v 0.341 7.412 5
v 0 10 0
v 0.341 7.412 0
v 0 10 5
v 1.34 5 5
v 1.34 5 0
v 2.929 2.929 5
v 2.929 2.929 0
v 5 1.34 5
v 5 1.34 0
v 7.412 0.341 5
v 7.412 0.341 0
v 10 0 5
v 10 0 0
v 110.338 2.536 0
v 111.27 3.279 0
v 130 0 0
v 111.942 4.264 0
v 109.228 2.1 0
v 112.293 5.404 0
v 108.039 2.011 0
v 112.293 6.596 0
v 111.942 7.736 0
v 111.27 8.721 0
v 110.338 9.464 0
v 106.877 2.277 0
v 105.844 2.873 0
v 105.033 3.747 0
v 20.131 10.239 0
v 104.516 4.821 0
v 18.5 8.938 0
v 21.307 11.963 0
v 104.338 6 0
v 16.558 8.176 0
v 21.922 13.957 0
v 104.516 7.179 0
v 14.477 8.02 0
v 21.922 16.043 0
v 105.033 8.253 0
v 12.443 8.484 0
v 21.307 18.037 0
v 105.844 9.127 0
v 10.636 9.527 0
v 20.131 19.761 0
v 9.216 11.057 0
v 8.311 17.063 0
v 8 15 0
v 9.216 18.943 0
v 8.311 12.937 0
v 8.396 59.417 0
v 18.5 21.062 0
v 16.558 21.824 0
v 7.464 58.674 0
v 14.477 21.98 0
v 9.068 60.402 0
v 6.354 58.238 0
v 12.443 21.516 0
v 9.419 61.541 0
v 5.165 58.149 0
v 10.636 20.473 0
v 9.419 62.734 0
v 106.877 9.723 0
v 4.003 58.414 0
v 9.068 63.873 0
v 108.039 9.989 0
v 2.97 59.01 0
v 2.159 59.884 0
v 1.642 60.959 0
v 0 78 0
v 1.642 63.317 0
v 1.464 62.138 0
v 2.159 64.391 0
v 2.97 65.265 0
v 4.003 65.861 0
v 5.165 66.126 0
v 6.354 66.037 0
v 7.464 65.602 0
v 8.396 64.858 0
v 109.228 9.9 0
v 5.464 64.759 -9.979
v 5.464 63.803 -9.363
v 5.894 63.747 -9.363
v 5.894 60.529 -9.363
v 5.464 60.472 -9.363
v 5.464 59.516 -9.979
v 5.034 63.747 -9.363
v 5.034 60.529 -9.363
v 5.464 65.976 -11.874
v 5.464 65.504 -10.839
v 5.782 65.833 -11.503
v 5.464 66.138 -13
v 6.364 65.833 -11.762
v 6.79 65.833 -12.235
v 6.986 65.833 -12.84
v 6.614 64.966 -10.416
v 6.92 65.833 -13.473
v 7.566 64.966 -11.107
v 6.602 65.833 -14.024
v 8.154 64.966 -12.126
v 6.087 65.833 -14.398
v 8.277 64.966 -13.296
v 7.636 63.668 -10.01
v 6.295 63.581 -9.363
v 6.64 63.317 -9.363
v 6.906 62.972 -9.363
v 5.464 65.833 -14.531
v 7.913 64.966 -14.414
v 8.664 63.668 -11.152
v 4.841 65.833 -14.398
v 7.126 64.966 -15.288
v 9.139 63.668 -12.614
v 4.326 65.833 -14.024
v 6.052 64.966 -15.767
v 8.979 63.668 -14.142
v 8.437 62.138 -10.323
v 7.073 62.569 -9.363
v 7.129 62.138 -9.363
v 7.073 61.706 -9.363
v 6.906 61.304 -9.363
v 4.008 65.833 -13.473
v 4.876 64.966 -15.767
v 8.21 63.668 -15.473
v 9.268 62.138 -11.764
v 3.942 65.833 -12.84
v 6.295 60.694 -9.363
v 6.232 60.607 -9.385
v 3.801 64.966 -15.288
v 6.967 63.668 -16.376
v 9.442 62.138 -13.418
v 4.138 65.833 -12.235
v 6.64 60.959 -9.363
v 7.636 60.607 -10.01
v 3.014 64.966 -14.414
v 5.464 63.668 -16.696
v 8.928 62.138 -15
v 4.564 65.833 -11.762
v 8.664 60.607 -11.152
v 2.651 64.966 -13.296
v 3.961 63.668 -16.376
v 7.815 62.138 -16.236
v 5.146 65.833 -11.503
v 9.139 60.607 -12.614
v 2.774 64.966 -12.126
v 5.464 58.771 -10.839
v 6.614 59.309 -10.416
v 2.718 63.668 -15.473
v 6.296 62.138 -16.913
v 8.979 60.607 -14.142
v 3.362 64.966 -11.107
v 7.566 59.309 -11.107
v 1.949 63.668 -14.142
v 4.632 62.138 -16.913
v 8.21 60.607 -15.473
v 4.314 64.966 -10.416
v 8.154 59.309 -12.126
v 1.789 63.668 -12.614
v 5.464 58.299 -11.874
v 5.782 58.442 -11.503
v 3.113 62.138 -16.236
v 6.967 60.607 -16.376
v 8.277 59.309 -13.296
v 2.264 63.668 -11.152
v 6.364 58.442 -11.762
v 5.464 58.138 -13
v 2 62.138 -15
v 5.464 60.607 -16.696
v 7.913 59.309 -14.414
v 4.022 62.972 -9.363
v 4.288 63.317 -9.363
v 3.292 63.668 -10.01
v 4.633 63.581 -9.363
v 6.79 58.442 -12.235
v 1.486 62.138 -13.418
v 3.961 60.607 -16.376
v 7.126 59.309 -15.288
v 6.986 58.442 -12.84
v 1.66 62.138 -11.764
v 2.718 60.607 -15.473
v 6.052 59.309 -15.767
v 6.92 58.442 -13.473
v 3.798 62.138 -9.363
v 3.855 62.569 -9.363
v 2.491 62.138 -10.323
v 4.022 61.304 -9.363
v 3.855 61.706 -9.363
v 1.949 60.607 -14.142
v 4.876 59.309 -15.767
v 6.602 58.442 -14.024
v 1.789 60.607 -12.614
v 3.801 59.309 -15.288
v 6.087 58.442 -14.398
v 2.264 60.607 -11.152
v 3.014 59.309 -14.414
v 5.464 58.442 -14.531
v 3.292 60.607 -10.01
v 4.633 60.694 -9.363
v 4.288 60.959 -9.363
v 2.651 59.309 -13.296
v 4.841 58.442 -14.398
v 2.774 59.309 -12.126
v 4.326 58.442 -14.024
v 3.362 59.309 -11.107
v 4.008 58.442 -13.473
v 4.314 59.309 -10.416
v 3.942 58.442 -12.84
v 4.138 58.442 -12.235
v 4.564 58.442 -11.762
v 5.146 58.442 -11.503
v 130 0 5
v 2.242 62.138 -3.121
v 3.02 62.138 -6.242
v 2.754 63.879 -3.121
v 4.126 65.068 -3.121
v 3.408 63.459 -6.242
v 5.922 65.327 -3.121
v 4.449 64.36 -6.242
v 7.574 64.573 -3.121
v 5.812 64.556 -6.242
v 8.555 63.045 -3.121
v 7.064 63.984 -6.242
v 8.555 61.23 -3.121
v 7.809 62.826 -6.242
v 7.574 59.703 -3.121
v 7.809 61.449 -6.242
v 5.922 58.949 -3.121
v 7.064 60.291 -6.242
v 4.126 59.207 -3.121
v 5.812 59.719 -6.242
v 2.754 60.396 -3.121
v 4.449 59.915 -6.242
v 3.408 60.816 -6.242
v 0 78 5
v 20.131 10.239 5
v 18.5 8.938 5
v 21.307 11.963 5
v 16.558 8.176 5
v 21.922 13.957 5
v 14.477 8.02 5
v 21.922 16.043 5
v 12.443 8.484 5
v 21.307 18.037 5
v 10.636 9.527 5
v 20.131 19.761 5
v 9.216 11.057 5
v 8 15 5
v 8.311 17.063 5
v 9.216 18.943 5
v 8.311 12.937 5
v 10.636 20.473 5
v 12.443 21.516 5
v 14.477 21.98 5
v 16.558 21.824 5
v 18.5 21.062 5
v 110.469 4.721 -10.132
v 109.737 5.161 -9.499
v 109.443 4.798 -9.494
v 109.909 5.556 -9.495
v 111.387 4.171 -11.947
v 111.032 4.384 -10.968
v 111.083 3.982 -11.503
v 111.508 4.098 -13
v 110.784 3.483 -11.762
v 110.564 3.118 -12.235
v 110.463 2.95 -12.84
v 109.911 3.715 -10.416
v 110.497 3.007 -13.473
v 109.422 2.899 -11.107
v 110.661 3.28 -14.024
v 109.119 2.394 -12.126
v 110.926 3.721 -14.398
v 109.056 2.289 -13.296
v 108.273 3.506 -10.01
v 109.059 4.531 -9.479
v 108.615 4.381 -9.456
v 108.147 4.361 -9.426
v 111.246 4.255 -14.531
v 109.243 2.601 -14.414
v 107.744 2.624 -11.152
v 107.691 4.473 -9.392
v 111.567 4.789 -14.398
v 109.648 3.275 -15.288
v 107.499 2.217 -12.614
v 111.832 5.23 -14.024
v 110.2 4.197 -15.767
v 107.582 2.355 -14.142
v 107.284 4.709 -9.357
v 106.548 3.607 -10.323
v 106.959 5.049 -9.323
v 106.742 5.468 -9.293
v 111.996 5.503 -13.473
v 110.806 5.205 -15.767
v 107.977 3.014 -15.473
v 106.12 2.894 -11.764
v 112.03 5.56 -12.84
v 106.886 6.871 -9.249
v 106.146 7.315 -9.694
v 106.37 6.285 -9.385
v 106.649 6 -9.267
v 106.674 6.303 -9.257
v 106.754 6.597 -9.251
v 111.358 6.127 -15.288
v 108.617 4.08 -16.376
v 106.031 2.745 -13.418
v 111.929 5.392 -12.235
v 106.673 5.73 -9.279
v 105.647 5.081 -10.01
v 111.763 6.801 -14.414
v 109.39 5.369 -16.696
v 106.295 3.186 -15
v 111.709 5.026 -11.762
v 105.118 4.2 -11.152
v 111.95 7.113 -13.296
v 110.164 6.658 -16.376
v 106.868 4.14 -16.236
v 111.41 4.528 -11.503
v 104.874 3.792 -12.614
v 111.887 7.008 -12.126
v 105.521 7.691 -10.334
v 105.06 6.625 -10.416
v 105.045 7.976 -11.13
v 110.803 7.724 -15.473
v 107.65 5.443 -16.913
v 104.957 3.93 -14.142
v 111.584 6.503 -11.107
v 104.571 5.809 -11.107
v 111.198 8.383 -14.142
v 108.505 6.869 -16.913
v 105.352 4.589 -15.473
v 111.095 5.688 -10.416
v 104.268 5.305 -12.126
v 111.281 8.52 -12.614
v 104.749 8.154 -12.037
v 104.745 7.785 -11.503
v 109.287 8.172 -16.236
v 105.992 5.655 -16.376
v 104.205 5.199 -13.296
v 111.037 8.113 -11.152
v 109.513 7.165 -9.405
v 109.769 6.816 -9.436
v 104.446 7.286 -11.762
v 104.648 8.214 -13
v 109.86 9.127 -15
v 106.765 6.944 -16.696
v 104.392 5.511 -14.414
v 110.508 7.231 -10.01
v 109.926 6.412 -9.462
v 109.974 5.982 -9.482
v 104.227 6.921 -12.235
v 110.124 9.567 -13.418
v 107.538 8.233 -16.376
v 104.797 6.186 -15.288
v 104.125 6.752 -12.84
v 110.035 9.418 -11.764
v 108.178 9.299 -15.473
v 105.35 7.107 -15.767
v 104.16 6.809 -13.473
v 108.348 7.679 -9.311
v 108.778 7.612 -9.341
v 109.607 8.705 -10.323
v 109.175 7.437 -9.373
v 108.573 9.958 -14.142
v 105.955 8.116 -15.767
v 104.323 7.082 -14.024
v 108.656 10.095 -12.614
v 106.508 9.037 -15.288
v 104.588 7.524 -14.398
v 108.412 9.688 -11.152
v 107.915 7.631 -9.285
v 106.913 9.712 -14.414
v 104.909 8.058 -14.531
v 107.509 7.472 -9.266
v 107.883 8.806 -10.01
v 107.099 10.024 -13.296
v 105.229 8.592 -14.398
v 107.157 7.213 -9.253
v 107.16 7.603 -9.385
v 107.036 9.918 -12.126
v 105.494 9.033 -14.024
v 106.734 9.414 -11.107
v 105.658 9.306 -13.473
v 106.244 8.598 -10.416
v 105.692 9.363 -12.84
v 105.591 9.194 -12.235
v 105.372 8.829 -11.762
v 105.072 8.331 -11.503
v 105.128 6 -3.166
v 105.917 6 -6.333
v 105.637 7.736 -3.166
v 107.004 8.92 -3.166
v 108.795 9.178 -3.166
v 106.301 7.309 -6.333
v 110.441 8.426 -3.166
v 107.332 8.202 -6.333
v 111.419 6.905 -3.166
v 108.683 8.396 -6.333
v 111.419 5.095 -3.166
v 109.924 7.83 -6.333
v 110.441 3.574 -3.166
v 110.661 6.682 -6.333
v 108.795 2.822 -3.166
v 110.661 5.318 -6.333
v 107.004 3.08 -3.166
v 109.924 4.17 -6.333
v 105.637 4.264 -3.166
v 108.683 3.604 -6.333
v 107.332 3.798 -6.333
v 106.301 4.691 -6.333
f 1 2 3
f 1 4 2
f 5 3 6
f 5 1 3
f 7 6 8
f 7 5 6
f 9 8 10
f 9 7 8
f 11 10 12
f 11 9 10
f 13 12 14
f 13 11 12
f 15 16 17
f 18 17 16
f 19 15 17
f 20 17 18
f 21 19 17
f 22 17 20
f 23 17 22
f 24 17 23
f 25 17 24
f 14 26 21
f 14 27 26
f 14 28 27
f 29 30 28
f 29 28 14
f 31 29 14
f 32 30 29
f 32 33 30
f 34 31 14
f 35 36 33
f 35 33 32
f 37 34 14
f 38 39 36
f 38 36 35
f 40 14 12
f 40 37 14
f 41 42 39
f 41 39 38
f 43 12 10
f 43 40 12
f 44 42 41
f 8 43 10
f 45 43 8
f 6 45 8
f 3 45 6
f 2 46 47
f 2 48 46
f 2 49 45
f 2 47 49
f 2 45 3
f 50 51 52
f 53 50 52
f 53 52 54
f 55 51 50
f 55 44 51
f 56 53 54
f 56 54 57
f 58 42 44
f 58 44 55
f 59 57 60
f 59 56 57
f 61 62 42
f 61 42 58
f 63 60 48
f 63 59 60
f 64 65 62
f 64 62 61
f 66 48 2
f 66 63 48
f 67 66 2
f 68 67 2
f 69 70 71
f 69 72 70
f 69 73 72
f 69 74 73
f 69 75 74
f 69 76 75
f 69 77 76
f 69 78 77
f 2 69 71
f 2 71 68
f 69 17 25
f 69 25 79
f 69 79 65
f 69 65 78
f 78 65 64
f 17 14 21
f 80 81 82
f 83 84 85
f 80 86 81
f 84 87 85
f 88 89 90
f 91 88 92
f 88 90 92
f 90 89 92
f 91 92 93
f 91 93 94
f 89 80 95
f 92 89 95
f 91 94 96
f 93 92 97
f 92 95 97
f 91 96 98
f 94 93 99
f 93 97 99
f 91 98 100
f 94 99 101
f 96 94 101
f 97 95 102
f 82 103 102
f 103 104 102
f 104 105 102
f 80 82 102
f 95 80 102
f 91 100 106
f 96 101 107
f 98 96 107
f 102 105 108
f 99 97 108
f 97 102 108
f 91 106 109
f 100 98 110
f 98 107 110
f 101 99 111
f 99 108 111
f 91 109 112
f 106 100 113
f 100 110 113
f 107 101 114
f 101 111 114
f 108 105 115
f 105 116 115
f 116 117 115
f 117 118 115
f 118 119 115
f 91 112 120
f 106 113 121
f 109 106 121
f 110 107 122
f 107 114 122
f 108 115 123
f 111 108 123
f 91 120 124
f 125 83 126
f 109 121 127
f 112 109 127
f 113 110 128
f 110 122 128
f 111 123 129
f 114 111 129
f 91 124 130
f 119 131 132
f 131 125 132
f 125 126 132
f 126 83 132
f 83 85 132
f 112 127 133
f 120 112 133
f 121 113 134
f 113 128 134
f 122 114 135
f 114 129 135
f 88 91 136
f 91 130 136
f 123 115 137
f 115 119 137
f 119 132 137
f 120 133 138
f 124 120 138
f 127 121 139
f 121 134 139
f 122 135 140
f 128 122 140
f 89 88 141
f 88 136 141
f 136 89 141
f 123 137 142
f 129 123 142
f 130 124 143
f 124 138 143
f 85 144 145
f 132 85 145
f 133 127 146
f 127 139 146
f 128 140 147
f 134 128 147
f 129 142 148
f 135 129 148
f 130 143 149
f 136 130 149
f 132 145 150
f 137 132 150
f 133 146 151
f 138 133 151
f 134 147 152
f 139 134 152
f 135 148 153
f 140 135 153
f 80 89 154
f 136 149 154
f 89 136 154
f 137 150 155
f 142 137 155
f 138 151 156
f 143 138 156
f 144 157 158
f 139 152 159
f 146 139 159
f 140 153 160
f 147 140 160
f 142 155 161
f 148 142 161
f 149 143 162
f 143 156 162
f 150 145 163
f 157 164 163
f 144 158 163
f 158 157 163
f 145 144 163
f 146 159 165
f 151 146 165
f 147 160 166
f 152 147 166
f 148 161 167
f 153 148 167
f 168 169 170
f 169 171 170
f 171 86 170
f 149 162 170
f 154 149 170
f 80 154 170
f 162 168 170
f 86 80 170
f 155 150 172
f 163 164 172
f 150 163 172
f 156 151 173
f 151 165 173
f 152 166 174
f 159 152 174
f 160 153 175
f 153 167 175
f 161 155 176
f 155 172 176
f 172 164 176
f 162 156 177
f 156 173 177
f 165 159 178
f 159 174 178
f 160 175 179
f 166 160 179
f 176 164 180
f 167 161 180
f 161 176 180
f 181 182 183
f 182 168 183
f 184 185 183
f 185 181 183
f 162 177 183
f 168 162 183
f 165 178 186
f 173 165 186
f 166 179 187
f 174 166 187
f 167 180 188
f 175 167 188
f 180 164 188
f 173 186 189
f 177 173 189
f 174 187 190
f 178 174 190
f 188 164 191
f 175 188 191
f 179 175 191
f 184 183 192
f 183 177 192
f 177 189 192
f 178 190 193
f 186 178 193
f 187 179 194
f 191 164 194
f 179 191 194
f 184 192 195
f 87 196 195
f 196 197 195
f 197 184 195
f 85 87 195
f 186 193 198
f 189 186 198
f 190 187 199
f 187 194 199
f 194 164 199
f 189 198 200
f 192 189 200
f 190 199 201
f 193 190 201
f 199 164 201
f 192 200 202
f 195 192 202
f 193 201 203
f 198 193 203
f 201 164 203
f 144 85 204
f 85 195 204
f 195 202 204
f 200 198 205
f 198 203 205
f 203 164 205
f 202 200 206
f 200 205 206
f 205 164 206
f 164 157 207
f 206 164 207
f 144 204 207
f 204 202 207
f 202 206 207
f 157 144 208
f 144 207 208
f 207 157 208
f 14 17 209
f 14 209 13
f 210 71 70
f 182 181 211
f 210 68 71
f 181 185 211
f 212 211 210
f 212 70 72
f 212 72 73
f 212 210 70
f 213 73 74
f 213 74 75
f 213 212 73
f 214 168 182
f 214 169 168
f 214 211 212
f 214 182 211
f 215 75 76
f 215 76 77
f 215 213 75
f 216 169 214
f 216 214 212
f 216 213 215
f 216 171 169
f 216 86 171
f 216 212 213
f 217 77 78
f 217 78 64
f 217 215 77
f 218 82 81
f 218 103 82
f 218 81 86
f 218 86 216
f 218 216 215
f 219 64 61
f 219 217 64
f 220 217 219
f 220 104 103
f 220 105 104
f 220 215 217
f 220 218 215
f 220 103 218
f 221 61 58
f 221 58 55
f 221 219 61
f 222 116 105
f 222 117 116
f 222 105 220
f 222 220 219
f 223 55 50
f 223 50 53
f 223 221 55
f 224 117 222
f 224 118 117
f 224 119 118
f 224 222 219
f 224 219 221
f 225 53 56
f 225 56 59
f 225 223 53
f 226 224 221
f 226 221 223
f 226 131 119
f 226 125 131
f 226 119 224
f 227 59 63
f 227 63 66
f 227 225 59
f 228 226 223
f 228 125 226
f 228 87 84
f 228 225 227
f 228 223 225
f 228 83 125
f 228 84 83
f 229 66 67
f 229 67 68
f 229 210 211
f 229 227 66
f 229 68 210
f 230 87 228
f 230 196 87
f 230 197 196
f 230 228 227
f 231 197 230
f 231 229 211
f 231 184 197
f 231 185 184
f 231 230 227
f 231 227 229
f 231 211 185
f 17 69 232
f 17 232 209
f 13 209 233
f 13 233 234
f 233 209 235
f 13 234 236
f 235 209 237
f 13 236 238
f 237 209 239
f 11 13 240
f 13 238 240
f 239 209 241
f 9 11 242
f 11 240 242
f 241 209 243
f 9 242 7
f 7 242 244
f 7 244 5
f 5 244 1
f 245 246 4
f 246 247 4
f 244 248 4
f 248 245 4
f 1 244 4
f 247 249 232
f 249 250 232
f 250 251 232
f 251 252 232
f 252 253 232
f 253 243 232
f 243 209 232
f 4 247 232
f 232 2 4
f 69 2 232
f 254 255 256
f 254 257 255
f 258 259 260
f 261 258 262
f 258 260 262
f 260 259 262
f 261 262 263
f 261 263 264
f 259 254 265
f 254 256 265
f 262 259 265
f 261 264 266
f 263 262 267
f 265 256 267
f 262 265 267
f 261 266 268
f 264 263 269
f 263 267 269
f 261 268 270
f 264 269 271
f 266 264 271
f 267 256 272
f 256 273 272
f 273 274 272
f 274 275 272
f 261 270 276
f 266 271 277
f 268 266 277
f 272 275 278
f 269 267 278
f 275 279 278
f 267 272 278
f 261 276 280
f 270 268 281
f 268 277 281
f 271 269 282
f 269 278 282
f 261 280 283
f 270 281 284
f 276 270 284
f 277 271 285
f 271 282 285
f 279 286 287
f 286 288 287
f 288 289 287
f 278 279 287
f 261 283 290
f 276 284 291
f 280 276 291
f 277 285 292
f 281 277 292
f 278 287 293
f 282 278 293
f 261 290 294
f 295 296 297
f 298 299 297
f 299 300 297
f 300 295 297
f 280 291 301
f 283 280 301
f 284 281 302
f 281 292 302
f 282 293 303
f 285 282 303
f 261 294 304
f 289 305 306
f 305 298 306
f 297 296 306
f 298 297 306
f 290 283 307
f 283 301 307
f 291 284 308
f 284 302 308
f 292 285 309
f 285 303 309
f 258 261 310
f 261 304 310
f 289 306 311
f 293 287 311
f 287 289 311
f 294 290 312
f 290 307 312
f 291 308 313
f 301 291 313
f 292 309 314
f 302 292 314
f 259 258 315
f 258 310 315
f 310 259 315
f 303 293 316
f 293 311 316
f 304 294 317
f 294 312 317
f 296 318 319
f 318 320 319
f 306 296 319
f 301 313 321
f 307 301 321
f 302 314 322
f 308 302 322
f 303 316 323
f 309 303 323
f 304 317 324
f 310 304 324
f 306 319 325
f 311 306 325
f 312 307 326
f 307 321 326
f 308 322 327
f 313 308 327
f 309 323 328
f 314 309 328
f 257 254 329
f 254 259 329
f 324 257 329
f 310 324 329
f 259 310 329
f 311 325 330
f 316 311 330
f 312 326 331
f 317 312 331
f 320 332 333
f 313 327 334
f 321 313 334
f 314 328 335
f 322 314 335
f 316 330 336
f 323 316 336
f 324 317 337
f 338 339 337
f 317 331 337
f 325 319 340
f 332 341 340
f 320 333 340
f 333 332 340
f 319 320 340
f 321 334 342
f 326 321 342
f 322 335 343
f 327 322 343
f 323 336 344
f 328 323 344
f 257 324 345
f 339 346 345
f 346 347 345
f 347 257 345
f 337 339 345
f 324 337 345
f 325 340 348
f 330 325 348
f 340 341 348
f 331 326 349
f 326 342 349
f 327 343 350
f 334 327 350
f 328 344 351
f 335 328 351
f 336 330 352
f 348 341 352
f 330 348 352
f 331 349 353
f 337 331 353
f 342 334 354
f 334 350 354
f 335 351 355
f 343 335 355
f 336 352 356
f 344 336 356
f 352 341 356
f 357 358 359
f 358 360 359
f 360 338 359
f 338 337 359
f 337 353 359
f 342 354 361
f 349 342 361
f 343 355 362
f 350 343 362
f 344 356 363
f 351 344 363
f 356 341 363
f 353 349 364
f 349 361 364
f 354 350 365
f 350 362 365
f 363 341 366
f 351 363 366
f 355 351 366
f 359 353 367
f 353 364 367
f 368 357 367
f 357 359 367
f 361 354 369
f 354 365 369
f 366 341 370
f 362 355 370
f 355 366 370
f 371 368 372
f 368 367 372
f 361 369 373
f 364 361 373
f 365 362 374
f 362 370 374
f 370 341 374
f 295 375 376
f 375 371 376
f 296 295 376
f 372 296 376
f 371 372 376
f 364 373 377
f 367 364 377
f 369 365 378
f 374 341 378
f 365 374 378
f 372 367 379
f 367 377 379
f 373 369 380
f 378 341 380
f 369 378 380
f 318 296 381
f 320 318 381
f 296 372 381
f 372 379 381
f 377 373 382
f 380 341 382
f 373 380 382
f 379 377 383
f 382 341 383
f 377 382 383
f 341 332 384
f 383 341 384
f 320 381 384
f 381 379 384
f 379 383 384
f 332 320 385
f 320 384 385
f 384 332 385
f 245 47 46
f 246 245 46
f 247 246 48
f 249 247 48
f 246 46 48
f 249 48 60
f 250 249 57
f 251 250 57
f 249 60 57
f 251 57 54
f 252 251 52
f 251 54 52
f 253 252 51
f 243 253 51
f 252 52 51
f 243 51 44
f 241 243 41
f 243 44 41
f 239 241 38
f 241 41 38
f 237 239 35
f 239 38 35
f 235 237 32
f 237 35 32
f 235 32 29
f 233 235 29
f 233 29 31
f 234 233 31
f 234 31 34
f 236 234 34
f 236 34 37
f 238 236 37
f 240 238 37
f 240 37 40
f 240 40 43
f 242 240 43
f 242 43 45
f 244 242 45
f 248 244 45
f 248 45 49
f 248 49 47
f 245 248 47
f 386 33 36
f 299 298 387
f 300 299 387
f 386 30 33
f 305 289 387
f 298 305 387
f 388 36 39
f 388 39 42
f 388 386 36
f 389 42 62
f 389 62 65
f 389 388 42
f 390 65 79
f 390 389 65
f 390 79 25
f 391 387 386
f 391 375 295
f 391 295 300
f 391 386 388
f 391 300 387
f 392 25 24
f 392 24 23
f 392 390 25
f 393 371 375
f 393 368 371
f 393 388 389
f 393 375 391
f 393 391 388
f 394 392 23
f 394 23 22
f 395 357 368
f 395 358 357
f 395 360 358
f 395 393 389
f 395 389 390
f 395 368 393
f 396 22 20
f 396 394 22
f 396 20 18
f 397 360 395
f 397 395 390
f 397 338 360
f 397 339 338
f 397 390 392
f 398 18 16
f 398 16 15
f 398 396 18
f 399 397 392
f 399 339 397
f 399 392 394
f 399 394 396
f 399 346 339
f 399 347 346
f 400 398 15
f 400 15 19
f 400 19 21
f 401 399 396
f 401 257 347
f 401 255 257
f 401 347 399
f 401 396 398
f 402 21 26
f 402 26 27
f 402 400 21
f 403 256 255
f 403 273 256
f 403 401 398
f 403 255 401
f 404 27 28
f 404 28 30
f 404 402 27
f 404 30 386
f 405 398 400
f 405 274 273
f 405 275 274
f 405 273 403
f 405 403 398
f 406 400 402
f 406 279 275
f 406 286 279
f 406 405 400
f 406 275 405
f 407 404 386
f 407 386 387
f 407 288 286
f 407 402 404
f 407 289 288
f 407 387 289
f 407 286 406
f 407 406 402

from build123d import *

# Parameters (mm, degrees)
ESTRUSIONE_ESTRUSIONE1_DEPTH = 5
SCHIZZO2_R                   = 7
TAGLIO_ESTRUSIONE1_DEPTH     = 152.6871781
RACCORDO1_R                  = 10
SCHIZZO10_R                  = 4
ESTRUSIONE_ESTRUSIONE2_DEPTH = 10
ESTRUSIONE_ESTRUSIONE2_TAPER = 14
SCHIZZO13_R                  = 4
ESTRUSIONE_ESTRUSIONE3_DEPTH = 10
ESTRUSIONE_ESTRUSIONE3_TAPER = 14


with BuildPart() as part:
    # Schizzo1 → Estrusione-Estrusione1 (new body)
    with BuildSketch(Plane.XY):
        Polygon((0, 0), (0, 78), (130, 0), align=None)
    extrude(amount=ESTRUSIONE_ESTRUSIONE1_DEPTH)

    # Schizzo2 → Taglio-Estrusione1 (cut, through all)
    with BuildSketch(Plane(origin=(0, 0, 0), x_dir=(-1, 0, 0), z_dir=(0, 0, -1))):
        with Locations((-15, 15)):
            Circle(SCHIZZO2_R)
    extrude(amount=-TAGLIO_ESTRUSIONE1_DEPTH, mode=Mode.SUBTRACT)

    # Raccordo1
    raccordo1_edges = [part.edges().sort_by_distance(p)[0] for p in [
        (0, 0, 2.5),
    ]]
    fillet(raccordo1_edges, radius=RACCORDO1_R)

    # Schizzo10 → Estrusione-Estrusione2 (add)
    with BuildSketch(Plane(origin=(0, 0, 0), x_dir=(-1, 0, 0), z_dir=(0, 0, -1))):
        with Locations((-5.463985213, 62.137606809)):
            Circle(SCHIZZO10_R)
    extrude(amount=ESTRUSIONE_ESTRUSIONE2_DEPTH, taper=ESTRUSIONE_ESTRUSIONE2_TAPER)

    # Schizzo12 → Rivoluzione1 (revolve)
    with BuildSketch(Plane.ZY.offset(-5.463985213)):
        with BuildLine():
            Line((-13, 58.137606809), (-13, 66.137606809))
            ThreePointArc((-13, 66.137606809), (-9, 62.137606809), (-13, 58.137606809))
        make_face()
    revolve(axis=Axis((5.463985213, 58.137606809, -13), (0, 1, 0)))

    # Schizzo13 → Estrusione-Estrusione3 (add)
    with BuildSketch(Plane(origin=(0, 0, 0), x_dir=(-1, 0, 0), z_dir=(0, 0, -1))):
        with Locations((-108.33809621, 6)):
            Circle(SCHIZZO13_R)
    extrude(amount=ESTRUSIONE_ESTRUSIONE3_DEPTH, taper=ESTRUSIONE_ESTRUSIONE3_TAPER)

    # Schizzo15 → Rivoluzione2 (revolve)
    with BuildSketch(Plane(origin=(31.324790173, 52.207983622, 0), x_dir=(0.8574929257125442, -0.5144957554275265, 0), z_dir=(0.5144957554275265, 0.8574929257125442, 0))):
        with BuildLine():
            Line((85.508399812, 13), (93.508399812, 13))
            ThreePointArc((93.508399812, 13), (89.508399812, 9), (85.508399812, 13))
        make_face()
    revolve(axis=Axis((104.647638101, 8.214274866, -13), (0.8574929257125445, -0.5144957554275261, 0)))


solid = part.part
